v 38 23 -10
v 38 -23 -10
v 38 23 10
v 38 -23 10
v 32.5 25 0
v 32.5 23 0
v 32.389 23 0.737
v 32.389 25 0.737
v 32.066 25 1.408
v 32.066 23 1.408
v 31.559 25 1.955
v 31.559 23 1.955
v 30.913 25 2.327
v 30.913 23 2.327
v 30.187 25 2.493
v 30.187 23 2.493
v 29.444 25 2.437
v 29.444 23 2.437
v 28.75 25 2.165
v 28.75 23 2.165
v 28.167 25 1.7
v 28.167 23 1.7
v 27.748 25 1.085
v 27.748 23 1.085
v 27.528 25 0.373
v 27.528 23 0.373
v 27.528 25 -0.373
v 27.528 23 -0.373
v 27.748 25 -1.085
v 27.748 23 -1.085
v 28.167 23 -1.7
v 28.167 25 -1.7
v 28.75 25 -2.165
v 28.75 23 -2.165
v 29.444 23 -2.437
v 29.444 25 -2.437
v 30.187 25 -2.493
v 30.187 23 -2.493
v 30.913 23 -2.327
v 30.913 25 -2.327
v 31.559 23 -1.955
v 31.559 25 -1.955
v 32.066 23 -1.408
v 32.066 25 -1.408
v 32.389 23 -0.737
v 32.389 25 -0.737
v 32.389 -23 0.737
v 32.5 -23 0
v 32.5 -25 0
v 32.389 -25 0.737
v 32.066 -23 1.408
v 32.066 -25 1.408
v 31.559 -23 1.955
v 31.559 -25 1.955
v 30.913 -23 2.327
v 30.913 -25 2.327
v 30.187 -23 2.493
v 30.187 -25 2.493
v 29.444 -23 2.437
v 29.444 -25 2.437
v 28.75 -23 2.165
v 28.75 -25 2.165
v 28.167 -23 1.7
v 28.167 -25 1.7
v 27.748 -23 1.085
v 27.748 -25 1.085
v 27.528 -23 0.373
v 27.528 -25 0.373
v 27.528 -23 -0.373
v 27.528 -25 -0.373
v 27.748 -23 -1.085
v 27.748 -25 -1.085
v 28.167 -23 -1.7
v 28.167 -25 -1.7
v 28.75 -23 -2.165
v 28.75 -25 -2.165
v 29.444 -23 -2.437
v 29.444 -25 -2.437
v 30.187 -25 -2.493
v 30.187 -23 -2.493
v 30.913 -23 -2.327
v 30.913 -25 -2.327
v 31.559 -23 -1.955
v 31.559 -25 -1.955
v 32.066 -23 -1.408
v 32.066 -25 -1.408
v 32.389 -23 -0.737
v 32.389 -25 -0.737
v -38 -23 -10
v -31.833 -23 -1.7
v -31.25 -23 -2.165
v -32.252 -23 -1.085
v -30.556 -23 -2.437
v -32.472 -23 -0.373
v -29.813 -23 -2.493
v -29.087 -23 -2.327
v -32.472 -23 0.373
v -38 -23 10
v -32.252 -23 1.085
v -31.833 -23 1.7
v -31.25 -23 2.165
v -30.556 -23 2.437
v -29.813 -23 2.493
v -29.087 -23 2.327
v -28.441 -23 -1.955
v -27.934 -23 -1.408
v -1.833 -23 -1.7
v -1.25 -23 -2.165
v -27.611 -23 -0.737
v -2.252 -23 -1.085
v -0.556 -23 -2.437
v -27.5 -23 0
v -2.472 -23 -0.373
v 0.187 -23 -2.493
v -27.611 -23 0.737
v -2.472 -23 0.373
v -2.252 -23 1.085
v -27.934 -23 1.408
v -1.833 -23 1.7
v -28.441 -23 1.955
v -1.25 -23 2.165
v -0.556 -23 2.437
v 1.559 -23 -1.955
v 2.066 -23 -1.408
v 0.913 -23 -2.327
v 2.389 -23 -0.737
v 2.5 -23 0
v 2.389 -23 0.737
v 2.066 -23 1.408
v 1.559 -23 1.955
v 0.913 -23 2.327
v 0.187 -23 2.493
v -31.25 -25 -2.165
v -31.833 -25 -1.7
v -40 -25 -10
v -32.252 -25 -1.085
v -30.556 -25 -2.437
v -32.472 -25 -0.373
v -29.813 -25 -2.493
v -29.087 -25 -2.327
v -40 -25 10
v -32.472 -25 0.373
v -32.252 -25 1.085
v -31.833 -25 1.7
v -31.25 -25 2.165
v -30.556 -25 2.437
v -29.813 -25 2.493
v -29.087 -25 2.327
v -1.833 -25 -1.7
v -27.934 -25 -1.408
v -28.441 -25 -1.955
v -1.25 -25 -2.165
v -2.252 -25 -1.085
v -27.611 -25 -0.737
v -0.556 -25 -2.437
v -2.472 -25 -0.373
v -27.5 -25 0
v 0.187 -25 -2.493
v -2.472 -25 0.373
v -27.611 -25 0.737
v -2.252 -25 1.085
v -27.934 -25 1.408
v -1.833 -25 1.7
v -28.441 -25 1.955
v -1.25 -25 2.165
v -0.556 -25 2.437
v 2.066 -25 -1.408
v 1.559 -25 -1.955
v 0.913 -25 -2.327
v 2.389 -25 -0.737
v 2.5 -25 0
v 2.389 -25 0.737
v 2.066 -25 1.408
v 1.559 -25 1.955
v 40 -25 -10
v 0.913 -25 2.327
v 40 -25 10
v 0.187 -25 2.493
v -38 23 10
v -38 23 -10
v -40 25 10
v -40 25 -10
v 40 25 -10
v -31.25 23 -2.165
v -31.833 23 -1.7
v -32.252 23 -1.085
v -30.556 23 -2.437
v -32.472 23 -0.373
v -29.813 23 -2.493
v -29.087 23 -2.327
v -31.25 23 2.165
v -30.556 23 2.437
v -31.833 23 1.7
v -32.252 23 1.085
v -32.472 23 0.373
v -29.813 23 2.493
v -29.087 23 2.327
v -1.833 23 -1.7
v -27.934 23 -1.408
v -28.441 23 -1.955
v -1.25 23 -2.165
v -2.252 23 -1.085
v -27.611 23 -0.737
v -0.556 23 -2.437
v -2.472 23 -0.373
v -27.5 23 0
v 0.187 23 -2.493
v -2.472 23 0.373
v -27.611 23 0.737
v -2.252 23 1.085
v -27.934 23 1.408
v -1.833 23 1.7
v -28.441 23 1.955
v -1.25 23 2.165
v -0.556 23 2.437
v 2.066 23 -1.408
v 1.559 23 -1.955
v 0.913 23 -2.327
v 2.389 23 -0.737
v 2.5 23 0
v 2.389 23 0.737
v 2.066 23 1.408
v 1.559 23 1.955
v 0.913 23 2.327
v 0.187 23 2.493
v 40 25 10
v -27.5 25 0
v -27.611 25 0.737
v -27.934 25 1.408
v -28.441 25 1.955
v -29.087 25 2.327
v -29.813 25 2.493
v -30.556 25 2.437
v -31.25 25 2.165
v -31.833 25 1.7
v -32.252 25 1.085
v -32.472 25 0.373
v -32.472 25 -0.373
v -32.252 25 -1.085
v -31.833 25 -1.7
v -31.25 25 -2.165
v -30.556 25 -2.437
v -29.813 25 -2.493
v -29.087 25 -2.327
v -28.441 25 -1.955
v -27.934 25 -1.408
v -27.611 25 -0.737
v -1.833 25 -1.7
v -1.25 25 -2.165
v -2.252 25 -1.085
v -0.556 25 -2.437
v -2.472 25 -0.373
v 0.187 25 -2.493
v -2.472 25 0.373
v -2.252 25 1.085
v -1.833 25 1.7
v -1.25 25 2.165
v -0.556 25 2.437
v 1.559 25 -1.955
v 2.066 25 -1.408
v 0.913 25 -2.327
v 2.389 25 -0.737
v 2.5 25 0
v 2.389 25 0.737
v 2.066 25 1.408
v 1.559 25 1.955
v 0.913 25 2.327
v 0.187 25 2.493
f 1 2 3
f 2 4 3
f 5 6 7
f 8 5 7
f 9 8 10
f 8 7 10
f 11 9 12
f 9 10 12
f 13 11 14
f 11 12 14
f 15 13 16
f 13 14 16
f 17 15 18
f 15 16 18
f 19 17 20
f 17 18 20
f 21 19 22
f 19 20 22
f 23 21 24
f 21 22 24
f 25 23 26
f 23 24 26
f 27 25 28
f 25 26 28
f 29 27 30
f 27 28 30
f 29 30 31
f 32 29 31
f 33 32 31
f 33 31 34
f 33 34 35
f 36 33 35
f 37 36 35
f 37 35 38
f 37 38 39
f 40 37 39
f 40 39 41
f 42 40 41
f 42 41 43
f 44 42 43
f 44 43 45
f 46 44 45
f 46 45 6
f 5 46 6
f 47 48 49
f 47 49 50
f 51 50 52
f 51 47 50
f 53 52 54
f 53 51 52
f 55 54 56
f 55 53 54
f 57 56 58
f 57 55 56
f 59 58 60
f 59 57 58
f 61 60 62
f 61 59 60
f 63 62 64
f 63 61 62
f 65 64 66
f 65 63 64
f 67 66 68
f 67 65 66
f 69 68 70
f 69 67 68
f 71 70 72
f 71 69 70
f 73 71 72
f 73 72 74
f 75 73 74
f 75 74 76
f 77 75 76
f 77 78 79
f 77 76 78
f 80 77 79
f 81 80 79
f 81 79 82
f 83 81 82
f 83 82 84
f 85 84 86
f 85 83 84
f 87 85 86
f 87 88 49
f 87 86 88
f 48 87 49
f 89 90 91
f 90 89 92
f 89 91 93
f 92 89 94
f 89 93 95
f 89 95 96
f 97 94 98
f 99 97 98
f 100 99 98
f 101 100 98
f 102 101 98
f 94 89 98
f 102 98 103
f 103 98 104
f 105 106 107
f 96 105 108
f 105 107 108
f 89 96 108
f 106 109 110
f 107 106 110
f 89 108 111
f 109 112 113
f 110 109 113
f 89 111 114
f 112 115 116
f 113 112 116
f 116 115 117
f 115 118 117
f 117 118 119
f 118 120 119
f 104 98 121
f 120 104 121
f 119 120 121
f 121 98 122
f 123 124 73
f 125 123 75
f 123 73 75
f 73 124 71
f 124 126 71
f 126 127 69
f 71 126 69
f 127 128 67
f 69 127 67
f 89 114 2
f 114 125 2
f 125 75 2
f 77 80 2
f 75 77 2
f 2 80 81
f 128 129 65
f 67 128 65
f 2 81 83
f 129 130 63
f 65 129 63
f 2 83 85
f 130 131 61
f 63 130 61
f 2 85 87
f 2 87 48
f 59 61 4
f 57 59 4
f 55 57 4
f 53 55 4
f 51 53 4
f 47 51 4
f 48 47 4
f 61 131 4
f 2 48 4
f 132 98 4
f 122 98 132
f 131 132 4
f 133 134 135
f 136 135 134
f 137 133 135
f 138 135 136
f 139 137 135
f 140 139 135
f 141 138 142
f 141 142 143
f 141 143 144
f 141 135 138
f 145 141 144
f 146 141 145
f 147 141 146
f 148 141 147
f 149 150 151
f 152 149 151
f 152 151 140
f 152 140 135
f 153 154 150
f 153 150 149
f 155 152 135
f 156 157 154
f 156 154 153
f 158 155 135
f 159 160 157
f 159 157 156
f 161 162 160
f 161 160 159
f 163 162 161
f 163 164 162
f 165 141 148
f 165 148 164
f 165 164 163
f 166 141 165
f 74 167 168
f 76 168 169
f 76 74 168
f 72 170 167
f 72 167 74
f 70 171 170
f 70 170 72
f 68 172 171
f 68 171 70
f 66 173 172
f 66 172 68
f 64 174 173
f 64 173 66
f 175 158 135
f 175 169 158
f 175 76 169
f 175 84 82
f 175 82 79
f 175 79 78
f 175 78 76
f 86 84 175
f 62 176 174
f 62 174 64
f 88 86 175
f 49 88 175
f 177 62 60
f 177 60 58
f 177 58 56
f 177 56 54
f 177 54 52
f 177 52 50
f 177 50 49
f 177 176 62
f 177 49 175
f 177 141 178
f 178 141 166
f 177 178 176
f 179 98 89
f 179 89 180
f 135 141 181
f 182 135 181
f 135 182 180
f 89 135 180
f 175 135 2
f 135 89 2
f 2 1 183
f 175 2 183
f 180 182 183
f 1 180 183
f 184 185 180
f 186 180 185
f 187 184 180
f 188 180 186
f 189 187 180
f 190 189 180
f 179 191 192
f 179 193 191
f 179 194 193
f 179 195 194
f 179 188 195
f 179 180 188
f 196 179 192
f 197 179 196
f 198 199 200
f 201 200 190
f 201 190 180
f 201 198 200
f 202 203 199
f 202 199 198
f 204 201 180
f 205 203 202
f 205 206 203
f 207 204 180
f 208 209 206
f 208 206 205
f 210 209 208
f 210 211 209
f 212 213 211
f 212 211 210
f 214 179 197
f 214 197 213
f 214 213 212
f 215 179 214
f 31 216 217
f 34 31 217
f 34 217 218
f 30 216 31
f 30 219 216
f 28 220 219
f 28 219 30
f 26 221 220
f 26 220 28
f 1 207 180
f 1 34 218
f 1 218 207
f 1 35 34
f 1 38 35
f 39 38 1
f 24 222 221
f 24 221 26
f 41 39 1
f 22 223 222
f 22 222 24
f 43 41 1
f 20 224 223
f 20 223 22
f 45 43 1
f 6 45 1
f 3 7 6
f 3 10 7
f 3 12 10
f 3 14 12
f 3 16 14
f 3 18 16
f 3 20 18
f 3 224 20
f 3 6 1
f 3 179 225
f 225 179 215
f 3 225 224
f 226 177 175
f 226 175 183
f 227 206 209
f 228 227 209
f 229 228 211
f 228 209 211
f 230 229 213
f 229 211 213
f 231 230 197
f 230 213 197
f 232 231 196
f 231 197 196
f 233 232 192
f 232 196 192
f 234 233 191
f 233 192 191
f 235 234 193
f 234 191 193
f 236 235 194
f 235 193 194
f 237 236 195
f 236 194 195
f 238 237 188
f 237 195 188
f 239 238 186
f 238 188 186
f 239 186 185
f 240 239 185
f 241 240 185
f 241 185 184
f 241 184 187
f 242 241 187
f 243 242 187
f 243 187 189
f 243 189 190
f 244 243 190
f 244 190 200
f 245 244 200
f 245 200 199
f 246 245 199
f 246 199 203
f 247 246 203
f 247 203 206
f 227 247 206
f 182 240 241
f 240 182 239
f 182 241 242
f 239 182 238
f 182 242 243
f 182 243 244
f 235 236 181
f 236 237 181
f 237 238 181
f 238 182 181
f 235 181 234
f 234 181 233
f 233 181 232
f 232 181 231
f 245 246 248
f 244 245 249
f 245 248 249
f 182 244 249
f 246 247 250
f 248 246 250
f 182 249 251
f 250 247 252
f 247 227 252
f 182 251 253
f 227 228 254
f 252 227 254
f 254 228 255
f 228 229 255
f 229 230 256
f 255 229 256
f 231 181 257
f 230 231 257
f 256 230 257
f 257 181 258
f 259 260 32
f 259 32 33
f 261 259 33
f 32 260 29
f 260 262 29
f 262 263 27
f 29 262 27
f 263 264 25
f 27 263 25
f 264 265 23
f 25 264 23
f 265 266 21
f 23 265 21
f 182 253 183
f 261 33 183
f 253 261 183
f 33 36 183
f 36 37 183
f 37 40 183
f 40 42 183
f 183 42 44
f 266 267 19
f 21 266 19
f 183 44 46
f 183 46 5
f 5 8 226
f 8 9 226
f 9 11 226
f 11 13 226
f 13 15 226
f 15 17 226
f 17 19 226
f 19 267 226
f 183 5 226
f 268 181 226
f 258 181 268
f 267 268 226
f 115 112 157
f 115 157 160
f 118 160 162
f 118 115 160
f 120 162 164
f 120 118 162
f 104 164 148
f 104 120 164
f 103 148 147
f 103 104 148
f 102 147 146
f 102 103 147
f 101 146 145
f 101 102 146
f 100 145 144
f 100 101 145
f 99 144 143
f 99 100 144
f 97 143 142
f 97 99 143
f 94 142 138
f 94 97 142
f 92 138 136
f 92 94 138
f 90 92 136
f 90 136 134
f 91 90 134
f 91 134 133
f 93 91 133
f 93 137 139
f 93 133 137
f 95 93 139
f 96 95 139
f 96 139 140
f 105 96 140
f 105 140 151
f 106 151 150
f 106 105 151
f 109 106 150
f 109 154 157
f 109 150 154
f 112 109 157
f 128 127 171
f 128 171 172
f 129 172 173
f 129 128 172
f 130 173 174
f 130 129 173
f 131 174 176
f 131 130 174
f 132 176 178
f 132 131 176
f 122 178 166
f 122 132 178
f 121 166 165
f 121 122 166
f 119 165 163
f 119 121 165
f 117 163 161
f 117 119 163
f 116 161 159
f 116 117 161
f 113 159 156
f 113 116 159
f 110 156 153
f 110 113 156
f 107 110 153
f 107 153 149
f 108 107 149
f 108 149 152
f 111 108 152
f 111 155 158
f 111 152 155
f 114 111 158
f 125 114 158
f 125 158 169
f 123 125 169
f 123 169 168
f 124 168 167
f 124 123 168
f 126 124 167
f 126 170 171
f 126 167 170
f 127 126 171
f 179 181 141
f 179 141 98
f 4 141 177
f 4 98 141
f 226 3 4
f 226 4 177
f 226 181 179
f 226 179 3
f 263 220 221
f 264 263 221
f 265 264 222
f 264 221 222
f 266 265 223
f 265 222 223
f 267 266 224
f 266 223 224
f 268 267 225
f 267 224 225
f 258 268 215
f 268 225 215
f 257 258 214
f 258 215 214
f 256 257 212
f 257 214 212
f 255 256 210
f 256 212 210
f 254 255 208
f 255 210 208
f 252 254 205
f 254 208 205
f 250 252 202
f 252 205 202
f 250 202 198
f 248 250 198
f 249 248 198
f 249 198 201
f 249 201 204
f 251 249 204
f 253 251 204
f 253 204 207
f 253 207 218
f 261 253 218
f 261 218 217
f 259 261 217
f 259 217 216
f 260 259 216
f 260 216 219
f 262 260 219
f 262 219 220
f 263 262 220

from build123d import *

# Parameters (mm, degrees)
F0_W          = 80
F0_H          = 50
F0_W_2        = 76
F0_H_2        = 46
F1_DEPTH      = 10
F1_DEPTH_BACK = 10
F2_R          = 2.5
F3_DEPTH      = 40
F3_DEPTH_BACK = 40


with BuildPart() as f1:
    # F0 (on Top) → F1 (new body, two sides)
    with BuildSketch(Plane.XY) as f1_sk:
        Rectangle(F0_W, F0_H)
        Rectangle(F0_W_2, F0_H_2, mode=Mode.SUBTRACT)
    extrude(amount=F1_DEPTH)
    extrude(f1_sk.sketch, amount=-F1_DEPTH_BACK)

    # F2 (on Front) → F3 (cut, two sides)
    with BuildSketch(Plane.XZ) as f3_sk:
        with Locations((-30, 0)):
            Circle(F2_R)
        Circle(F2_R)
        with Locations((30, 0)):
            Circle(F2_R)
    extrude(amount=F3_DEPTH, mode=Mode.SUBTRACT)
    extrude(f3_sk.sketch, amount=-F3_DEPTH_BACK, mode=Mode.SUBTRACT)


solid = f1.part
